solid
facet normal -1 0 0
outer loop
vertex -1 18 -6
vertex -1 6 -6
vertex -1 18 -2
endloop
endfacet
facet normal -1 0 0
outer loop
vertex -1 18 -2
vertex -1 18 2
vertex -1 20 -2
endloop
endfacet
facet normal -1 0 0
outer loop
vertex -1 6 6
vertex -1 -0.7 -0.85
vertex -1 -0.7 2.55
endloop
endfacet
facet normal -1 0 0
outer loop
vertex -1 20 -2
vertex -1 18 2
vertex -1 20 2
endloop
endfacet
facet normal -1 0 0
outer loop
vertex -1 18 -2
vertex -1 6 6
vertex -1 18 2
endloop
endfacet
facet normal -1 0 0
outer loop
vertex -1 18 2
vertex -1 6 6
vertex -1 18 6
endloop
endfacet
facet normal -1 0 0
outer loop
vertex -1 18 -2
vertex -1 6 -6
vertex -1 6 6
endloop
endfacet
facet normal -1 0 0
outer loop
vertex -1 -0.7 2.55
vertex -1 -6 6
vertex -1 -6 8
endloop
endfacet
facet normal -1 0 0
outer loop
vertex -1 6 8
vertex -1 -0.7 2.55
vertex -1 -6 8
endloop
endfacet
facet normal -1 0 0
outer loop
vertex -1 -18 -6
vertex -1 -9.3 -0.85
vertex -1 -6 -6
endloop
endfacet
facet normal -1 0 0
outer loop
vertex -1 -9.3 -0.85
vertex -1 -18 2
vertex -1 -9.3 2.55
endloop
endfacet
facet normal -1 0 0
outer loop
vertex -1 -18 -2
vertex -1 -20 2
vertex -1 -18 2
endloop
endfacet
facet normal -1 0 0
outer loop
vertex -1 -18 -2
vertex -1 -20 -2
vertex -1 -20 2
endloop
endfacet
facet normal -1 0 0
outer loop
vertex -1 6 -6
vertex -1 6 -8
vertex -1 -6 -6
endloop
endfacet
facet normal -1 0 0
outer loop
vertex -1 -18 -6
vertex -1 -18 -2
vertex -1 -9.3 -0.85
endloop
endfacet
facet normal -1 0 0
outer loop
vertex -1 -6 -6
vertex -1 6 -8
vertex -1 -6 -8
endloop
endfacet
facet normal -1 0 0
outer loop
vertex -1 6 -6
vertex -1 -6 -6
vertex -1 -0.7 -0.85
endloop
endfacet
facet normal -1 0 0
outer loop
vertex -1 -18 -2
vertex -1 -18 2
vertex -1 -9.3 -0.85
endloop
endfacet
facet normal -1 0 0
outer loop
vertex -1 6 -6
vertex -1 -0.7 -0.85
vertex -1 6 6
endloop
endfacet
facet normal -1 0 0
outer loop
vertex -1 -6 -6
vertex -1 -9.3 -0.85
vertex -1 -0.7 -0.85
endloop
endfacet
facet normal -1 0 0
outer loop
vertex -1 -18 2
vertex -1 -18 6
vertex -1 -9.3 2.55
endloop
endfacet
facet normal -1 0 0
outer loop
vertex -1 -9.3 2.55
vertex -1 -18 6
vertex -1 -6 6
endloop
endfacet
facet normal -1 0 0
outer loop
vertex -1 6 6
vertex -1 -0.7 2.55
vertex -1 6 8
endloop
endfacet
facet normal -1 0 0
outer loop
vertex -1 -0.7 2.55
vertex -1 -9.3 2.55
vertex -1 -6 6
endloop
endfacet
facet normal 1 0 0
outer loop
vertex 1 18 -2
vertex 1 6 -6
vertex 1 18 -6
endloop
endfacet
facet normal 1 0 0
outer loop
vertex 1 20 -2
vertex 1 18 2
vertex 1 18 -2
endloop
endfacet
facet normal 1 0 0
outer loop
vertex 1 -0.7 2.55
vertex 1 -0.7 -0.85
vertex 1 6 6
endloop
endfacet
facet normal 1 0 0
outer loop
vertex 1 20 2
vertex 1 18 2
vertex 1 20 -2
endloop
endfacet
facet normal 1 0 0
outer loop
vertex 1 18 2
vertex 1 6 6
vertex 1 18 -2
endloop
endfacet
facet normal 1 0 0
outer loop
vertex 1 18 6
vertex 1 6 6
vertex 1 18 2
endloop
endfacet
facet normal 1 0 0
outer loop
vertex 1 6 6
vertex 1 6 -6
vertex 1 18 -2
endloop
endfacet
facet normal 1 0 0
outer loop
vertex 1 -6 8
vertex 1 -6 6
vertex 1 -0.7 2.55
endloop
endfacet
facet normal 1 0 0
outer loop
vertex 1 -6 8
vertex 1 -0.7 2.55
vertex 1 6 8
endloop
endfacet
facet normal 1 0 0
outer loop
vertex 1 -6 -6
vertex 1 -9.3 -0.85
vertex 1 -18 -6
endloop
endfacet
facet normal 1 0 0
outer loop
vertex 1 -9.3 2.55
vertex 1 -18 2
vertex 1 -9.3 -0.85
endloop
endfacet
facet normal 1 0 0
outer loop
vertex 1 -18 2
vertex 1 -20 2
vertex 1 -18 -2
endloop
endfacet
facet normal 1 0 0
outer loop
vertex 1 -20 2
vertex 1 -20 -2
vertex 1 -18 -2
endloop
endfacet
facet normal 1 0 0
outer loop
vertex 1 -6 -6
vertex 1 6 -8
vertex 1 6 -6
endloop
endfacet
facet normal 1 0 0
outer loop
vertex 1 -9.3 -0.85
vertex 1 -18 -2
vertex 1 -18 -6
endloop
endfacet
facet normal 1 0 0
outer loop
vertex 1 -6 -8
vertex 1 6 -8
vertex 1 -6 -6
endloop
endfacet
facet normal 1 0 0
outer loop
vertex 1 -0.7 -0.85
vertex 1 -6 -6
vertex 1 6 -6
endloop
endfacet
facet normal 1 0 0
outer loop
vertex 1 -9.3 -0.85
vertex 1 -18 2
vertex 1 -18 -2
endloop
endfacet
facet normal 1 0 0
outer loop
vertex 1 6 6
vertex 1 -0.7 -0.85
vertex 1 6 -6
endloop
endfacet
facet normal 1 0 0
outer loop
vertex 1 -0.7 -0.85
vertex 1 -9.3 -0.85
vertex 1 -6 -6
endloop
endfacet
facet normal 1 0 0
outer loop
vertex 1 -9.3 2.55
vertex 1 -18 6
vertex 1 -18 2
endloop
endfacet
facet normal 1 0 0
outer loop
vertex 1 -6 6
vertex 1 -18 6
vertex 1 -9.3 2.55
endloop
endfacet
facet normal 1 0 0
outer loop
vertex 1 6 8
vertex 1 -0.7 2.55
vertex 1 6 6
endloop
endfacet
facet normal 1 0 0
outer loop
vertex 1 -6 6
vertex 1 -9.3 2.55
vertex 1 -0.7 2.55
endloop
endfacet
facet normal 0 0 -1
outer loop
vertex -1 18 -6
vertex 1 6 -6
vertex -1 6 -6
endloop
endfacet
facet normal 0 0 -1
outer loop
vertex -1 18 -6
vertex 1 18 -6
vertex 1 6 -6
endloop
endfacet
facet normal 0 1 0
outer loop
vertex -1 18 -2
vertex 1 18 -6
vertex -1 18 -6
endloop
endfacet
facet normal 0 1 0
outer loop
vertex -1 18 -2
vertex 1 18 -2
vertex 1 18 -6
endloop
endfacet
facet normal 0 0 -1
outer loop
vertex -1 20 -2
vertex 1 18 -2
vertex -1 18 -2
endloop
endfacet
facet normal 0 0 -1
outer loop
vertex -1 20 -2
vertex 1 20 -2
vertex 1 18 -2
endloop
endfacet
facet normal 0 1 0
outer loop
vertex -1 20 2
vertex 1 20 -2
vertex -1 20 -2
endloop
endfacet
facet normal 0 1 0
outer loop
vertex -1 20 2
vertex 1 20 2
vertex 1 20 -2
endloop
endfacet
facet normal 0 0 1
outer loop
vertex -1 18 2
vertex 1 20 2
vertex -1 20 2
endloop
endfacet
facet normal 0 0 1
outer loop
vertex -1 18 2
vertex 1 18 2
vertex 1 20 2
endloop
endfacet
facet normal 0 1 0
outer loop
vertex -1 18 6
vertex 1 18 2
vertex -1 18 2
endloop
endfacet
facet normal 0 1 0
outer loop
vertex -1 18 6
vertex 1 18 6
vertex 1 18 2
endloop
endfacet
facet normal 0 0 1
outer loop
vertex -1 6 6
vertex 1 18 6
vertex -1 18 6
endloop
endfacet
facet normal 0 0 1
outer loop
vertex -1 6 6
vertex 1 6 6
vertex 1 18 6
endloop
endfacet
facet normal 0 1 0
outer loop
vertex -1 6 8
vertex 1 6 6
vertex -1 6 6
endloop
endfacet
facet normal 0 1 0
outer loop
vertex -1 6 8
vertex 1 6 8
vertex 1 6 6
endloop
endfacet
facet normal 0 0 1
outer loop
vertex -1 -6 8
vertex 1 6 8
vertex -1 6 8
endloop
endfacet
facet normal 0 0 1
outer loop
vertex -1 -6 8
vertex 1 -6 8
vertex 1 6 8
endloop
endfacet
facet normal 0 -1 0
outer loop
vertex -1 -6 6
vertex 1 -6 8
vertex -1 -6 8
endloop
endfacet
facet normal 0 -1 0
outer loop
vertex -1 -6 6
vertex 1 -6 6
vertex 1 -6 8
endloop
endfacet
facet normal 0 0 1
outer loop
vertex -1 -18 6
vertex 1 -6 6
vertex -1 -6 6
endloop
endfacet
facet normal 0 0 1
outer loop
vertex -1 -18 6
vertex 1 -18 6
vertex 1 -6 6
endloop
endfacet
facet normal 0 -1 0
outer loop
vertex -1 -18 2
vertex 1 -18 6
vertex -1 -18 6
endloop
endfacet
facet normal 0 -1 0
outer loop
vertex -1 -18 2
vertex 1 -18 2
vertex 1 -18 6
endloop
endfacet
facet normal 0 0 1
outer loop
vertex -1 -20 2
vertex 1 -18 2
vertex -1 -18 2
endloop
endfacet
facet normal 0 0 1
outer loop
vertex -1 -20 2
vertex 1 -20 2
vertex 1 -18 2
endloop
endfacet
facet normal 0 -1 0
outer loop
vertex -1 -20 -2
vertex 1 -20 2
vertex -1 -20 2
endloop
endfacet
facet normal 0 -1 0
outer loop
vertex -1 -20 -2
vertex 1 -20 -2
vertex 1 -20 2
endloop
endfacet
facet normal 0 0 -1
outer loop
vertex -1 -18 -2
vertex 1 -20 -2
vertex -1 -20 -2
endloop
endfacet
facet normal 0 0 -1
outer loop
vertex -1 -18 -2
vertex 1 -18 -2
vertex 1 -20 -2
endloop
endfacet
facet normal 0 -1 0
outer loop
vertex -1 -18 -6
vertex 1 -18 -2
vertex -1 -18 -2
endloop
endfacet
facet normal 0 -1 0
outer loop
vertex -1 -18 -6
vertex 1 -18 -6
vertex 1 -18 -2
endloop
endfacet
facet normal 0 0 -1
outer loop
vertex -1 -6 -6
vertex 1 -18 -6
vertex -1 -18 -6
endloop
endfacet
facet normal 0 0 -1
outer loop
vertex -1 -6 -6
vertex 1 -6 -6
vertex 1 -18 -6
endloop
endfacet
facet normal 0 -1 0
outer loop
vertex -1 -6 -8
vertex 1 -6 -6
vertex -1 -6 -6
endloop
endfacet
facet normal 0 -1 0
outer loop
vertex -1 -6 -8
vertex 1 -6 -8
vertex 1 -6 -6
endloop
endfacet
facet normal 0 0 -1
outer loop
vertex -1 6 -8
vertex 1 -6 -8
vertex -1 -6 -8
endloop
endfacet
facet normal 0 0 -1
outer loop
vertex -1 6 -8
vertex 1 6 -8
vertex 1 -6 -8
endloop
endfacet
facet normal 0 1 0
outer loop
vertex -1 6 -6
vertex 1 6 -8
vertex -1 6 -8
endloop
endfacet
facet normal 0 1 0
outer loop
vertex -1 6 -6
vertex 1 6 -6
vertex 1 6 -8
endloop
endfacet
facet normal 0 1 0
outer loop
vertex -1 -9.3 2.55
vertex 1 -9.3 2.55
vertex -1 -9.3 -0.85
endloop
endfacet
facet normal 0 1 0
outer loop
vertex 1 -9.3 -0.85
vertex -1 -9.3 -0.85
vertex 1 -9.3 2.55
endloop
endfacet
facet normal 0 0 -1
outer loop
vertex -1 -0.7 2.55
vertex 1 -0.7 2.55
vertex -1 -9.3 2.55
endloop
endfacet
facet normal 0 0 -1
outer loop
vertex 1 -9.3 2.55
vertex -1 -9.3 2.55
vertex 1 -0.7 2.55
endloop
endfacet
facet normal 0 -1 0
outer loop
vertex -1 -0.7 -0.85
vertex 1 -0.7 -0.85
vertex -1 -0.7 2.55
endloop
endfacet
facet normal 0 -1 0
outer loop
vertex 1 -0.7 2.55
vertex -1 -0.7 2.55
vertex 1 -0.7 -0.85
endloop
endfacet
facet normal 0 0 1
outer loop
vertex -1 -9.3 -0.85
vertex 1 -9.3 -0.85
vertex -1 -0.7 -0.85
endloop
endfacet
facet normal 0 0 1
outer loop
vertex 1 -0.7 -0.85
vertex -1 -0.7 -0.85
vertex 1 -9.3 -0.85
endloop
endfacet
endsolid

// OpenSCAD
// file: ../lib/side.scad
module side_top_bottom(inner_x,inner_y,width) {
  x = inner_x/2;
  y = inner_y/2;

  polygon(points=[
      [-x-width,-y-width],
      [-x*1/3,-y-width],
      [-x*1/3,-y],
      [x*1/3,-y],
      [x*1/3,-y-width],
      [x+width,-y-width],
      [x+width,-y*1/3],
      [x,-y*1/3],
      [x,y*1/3],
      [x+width,y*1/3],
      [x+width,y+width],
      [x*1/3,y+width],
      [x*1/3,y],
      [-x*1/3,y],
      [-x*1/3,y+width],
      [-x-width,y+width],
      [-x-width,y*1/3],
      [-x,y*1/3],
      [-x,-y*1/3],
      [-x-width,-y*1/3],
    ],convexity=10);
}

module side_left_right(inner_x,inner_z,width) {
  x = inner_x/2;
  z = inner_z/2;

  polygon(points=[
      [-x-width,-z],
      [-x*1/3,-z],
      [-x*1/3,-z-width],
      [x*1/3,-z-width],
      [x*1/3,-z],
      [x+width,-z],
      [x+width,-z*1/3],
      [x,-z*1/3],
      [x,z*1/3],
      [x+width,z*1/3],
      [x+width,z],
      [x*1/3,z],
      [x*1/3,z+width],
      [-x*1/3,z+width],
      [-x*1/3,z],
      [-x-width,z],
      [-x-width,z*1/3],
      [-x,z*1/3],
      [-x,-z*1/3],
      [-x-width,-z*1/3],
    ],convexity=10);
}


module side_front_back(inner_y,inner_z,width) {
  y = inner_y/2;
  z = inner_z/2;

  polygon(points=[
      [-y,-z],
      [-y*1/3,-z],
      [-y*1/3,-z-width],
      [y*1/3,-z-width],
      [y*1/3,-z],
      [y,-z],
      [y,-z*1/3],
      [y+width,-z*1/3],
      [y+width,z*1/3],
      [y,z*1/3],
      [y,z],
      [y*1/3,z],
      [y*1/3,z+width],
      [-y*1/3,z+width],
      [-y*1/3,z],
      [-y,z],
      [-y,z*1/3],
      [-y-width,z*1/3],
      [-y-width,-z*1/3],
      [-y,-z*1/3],
    ],convexity=10);
}
// file: back.2d.scad
use <../lib/side.scad>

module back() {
  difference() {
    side_front_back(36,12,2);
    translate([-5,-12/2+6.85,0]) {
      polygon(points=[[-4.3,-1.7],[4.3,-1.7],[4.3,1.7],[-4.3,1.7],],convexity=10);
    }
  }
}

back();
// main file
use <back.2d.scad>;

rotate([90,0,90]) {
  linear_extrude(height = 2, center = true, convexity = 10, twist = 0) {
    back();
  }
}
